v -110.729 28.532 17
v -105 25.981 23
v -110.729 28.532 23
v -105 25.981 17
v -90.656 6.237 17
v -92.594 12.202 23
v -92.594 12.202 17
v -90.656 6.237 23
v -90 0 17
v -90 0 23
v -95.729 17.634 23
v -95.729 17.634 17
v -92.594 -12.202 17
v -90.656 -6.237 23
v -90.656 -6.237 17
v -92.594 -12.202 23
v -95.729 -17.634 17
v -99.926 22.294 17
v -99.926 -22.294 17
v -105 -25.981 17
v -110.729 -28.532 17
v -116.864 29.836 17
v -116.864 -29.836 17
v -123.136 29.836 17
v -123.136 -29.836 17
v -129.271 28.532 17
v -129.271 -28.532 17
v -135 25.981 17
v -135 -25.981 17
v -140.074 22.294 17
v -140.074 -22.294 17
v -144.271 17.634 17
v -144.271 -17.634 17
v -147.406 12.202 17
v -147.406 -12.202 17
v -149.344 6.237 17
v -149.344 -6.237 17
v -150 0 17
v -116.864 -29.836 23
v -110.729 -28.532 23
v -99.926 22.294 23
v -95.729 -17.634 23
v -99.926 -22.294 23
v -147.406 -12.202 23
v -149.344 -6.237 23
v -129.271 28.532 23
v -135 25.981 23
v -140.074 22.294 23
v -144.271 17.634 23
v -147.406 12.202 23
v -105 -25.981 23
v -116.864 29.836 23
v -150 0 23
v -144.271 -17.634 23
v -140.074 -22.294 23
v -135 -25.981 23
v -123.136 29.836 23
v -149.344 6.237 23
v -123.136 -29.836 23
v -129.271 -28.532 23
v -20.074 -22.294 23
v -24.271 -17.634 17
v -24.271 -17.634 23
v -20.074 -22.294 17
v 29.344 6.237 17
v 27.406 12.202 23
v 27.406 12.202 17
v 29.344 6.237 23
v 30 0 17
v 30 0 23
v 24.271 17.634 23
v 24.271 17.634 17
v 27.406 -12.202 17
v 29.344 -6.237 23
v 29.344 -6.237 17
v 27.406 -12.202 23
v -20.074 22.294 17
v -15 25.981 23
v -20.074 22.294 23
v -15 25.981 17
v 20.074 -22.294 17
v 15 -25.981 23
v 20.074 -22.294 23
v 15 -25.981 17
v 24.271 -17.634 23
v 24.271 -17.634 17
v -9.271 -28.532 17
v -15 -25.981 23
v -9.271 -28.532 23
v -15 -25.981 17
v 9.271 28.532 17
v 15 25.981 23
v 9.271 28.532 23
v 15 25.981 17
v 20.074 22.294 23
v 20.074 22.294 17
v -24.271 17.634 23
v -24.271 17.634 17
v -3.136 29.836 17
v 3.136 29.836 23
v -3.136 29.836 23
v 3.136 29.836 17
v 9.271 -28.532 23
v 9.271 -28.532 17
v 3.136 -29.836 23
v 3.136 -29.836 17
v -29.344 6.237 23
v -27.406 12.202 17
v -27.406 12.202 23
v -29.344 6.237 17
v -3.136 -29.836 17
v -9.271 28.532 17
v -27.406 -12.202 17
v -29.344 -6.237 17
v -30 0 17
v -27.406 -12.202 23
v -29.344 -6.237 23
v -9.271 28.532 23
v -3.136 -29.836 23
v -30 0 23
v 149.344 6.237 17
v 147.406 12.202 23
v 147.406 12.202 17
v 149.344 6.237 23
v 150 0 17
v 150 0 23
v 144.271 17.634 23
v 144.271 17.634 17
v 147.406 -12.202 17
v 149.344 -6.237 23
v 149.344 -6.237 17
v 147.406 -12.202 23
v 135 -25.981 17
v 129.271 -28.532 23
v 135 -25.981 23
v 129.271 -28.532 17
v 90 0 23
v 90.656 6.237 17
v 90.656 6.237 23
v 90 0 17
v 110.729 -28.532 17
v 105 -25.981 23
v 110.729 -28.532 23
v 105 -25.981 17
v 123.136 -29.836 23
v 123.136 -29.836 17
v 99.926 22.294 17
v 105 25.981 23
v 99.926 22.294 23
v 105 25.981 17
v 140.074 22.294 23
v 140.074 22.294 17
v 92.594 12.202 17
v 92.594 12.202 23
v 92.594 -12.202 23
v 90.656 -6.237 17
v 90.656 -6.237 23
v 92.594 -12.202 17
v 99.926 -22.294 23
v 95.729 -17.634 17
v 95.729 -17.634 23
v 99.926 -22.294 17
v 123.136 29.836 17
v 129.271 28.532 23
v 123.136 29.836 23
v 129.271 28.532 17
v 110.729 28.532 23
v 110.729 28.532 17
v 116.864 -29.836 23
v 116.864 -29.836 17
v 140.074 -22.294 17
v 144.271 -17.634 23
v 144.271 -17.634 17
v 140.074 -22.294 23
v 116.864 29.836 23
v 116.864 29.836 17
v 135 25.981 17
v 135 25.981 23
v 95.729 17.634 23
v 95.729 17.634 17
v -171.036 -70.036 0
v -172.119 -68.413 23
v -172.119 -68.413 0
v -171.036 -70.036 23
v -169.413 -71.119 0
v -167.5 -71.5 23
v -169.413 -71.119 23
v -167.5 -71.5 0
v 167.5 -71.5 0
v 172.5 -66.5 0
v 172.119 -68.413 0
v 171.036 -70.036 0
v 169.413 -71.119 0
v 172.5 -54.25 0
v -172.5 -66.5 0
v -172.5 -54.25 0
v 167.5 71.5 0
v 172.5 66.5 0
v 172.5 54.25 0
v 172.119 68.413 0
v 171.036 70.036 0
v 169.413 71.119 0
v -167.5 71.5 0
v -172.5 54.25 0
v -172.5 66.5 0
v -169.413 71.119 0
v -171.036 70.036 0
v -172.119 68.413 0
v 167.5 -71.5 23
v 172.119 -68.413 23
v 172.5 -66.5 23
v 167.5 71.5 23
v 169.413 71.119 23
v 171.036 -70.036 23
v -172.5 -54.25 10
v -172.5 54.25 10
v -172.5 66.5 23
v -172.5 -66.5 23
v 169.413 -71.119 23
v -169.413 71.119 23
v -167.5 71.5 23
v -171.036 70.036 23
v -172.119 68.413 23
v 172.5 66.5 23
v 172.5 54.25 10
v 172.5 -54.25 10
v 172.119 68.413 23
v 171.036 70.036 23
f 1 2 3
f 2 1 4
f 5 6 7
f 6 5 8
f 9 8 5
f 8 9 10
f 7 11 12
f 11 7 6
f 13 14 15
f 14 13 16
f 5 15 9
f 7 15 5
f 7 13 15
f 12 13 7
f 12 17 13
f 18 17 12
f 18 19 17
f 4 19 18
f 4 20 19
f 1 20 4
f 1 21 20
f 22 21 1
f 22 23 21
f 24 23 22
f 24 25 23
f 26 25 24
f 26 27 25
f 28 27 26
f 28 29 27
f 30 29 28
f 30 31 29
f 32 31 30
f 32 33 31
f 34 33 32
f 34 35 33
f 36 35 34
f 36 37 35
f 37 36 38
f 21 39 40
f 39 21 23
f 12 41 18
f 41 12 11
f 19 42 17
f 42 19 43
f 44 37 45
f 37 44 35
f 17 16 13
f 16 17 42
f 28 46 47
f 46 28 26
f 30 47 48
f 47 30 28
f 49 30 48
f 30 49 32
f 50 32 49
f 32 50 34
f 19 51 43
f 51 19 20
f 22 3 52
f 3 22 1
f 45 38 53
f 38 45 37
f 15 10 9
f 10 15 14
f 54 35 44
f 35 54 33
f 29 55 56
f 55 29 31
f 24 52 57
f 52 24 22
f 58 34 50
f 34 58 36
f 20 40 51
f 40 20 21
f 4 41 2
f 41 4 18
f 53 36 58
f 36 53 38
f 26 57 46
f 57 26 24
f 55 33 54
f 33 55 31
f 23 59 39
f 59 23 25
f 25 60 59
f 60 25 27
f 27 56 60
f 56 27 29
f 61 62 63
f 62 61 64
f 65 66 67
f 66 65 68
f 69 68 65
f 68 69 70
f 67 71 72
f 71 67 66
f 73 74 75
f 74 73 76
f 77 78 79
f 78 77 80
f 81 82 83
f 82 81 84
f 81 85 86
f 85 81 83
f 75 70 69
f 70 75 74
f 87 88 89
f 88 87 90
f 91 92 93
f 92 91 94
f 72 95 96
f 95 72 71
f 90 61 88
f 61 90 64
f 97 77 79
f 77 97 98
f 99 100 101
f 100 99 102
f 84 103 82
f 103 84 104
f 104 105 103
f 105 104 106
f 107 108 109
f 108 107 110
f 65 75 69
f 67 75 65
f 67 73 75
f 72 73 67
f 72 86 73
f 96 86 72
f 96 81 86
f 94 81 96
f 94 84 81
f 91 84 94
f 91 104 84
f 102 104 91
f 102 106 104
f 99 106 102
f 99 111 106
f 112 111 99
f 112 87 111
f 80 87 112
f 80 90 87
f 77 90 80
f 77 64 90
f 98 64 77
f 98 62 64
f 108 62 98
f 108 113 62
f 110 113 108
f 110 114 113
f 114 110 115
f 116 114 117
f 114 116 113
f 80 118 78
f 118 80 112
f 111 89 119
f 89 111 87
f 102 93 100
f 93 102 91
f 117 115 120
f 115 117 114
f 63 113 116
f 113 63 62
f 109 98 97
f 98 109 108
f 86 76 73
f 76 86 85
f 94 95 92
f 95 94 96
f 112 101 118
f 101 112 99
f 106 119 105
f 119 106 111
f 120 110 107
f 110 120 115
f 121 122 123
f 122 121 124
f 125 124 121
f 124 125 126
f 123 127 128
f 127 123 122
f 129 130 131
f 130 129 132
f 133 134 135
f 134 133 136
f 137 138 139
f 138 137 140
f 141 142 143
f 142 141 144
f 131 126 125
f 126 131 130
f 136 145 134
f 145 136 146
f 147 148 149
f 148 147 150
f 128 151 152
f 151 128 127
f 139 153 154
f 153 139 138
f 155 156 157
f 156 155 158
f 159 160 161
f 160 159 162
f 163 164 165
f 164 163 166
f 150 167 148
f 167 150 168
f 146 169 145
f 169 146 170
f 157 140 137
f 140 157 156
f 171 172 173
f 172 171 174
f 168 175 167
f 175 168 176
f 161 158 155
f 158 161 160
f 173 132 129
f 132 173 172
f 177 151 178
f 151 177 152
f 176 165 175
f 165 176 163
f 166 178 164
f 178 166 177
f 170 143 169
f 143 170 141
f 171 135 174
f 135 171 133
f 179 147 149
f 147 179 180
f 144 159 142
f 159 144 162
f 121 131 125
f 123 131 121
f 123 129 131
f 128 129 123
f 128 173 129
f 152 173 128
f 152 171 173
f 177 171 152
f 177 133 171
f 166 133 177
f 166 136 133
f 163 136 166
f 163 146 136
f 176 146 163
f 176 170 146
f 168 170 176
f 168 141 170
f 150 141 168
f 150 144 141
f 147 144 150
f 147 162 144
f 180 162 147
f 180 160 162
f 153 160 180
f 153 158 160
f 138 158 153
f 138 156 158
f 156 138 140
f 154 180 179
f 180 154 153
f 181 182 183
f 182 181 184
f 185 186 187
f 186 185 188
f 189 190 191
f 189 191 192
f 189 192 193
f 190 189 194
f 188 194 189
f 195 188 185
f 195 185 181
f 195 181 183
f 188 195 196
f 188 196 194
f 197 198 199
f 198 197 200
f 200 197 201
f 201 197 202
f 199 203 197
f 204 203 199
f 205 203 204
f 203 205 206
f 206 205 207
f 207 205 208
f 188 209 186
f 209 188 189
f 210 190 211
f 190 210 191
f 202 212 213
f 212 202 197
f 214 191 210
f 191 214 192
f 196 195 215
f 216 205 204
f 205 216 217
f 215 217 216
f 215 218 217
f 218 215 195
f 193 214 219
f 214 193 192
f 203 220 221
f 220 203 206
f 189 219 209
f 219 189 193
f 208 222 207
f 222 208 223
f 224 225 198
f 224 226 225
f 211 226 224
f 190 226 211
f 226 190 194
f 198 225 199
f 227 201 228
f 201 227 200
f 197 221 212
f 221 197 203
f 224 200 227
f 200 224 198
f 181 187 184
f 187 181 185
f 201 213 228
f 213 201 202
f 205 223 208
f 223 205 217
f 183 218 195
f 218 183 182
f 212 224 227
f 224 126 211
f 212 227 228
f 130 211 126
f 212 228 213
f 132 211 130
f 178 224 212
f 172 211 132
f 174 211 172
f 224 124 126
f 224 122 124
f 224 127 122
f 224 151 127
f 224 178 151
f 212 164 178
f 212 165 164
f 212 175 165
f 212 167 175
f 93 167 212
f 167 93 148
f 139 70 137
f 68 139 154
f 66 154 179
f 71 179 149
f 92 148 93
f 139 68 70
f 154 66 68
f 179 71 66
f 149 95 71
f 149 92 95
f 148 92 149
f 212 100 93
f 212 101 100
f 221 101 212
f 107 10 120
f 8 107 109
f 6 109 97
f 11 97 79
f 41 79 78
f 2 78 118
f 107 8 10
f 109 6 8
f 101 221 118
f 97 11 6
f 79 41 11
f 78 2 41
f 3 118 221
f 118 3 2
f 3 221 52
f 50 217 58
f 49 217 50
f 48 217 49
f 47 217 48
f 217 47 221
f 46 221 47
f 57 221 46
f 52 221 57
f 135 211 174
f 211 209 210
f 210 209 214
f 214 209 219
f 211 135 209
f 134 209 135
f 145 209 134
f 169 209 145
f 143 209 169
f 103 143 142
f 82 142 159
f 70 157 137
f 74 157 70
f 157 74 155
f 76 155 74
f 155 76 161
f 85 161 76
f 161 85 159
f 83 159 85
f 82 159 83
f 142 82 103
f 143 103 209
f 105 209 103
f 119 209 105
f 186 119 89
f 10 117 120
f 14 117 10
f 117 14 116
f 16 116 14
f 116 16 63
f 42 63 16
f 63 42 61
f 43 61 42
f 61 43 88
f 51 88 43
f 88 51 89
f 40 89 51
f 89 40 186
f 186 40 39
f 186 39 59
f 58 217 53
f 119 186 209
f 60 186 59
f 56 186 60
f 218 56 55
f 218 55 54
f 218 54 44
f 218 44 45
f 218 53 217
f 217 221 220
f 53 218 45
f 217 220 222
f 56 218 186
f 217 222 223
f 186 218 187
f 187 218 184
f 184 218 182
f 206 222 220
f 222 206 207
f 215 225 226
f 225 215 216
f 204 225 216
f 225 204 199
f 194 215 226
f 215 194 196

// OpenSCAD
LENGTH    = 345;
WIDTH     = 143;
DIAMETER  =  60;
SPACING   = 120;

RADIUS    =  15*0 + 5;
THICKNESS =   23;
DEPTH     =    6;

WIDTH2    = WIDTH - THICKNESS*1.5;
DEPTH2    =    10;


/*

1. - Saw ends flush
   - sand top+bottom

2. 19.0mm straight, from under, 10mm deep, preserve borders

3. Make jig: 56mm hole (bell saw)

4. 1cm spacing between piece and jig

5. 12.7mm combination bevel

6. Sand edges

7. Aquadecks

*/


module board() {
    dy = WIDTH/2 - RADIUS;
    dx = LENGTH/2 - RADIUS;
    hull()
    for (x=[-dx,dx])
      for (y=[-dy,dy])
          translate([x, y, 0])
          cylinder(r=RADIUS, h=THICKNESS);
}

module insets() {
    for(x=[-SPACING, 0, SPACING])
        translate([x, 0, THICKNESS-DEPTH])
            cylinder(d=DIAMETER, h= THICKNESS);
}

difference() {
    board();

    cube([LENGTH*2, WIDTH2, DEPTH2*2], center=true);

    insets();
}
